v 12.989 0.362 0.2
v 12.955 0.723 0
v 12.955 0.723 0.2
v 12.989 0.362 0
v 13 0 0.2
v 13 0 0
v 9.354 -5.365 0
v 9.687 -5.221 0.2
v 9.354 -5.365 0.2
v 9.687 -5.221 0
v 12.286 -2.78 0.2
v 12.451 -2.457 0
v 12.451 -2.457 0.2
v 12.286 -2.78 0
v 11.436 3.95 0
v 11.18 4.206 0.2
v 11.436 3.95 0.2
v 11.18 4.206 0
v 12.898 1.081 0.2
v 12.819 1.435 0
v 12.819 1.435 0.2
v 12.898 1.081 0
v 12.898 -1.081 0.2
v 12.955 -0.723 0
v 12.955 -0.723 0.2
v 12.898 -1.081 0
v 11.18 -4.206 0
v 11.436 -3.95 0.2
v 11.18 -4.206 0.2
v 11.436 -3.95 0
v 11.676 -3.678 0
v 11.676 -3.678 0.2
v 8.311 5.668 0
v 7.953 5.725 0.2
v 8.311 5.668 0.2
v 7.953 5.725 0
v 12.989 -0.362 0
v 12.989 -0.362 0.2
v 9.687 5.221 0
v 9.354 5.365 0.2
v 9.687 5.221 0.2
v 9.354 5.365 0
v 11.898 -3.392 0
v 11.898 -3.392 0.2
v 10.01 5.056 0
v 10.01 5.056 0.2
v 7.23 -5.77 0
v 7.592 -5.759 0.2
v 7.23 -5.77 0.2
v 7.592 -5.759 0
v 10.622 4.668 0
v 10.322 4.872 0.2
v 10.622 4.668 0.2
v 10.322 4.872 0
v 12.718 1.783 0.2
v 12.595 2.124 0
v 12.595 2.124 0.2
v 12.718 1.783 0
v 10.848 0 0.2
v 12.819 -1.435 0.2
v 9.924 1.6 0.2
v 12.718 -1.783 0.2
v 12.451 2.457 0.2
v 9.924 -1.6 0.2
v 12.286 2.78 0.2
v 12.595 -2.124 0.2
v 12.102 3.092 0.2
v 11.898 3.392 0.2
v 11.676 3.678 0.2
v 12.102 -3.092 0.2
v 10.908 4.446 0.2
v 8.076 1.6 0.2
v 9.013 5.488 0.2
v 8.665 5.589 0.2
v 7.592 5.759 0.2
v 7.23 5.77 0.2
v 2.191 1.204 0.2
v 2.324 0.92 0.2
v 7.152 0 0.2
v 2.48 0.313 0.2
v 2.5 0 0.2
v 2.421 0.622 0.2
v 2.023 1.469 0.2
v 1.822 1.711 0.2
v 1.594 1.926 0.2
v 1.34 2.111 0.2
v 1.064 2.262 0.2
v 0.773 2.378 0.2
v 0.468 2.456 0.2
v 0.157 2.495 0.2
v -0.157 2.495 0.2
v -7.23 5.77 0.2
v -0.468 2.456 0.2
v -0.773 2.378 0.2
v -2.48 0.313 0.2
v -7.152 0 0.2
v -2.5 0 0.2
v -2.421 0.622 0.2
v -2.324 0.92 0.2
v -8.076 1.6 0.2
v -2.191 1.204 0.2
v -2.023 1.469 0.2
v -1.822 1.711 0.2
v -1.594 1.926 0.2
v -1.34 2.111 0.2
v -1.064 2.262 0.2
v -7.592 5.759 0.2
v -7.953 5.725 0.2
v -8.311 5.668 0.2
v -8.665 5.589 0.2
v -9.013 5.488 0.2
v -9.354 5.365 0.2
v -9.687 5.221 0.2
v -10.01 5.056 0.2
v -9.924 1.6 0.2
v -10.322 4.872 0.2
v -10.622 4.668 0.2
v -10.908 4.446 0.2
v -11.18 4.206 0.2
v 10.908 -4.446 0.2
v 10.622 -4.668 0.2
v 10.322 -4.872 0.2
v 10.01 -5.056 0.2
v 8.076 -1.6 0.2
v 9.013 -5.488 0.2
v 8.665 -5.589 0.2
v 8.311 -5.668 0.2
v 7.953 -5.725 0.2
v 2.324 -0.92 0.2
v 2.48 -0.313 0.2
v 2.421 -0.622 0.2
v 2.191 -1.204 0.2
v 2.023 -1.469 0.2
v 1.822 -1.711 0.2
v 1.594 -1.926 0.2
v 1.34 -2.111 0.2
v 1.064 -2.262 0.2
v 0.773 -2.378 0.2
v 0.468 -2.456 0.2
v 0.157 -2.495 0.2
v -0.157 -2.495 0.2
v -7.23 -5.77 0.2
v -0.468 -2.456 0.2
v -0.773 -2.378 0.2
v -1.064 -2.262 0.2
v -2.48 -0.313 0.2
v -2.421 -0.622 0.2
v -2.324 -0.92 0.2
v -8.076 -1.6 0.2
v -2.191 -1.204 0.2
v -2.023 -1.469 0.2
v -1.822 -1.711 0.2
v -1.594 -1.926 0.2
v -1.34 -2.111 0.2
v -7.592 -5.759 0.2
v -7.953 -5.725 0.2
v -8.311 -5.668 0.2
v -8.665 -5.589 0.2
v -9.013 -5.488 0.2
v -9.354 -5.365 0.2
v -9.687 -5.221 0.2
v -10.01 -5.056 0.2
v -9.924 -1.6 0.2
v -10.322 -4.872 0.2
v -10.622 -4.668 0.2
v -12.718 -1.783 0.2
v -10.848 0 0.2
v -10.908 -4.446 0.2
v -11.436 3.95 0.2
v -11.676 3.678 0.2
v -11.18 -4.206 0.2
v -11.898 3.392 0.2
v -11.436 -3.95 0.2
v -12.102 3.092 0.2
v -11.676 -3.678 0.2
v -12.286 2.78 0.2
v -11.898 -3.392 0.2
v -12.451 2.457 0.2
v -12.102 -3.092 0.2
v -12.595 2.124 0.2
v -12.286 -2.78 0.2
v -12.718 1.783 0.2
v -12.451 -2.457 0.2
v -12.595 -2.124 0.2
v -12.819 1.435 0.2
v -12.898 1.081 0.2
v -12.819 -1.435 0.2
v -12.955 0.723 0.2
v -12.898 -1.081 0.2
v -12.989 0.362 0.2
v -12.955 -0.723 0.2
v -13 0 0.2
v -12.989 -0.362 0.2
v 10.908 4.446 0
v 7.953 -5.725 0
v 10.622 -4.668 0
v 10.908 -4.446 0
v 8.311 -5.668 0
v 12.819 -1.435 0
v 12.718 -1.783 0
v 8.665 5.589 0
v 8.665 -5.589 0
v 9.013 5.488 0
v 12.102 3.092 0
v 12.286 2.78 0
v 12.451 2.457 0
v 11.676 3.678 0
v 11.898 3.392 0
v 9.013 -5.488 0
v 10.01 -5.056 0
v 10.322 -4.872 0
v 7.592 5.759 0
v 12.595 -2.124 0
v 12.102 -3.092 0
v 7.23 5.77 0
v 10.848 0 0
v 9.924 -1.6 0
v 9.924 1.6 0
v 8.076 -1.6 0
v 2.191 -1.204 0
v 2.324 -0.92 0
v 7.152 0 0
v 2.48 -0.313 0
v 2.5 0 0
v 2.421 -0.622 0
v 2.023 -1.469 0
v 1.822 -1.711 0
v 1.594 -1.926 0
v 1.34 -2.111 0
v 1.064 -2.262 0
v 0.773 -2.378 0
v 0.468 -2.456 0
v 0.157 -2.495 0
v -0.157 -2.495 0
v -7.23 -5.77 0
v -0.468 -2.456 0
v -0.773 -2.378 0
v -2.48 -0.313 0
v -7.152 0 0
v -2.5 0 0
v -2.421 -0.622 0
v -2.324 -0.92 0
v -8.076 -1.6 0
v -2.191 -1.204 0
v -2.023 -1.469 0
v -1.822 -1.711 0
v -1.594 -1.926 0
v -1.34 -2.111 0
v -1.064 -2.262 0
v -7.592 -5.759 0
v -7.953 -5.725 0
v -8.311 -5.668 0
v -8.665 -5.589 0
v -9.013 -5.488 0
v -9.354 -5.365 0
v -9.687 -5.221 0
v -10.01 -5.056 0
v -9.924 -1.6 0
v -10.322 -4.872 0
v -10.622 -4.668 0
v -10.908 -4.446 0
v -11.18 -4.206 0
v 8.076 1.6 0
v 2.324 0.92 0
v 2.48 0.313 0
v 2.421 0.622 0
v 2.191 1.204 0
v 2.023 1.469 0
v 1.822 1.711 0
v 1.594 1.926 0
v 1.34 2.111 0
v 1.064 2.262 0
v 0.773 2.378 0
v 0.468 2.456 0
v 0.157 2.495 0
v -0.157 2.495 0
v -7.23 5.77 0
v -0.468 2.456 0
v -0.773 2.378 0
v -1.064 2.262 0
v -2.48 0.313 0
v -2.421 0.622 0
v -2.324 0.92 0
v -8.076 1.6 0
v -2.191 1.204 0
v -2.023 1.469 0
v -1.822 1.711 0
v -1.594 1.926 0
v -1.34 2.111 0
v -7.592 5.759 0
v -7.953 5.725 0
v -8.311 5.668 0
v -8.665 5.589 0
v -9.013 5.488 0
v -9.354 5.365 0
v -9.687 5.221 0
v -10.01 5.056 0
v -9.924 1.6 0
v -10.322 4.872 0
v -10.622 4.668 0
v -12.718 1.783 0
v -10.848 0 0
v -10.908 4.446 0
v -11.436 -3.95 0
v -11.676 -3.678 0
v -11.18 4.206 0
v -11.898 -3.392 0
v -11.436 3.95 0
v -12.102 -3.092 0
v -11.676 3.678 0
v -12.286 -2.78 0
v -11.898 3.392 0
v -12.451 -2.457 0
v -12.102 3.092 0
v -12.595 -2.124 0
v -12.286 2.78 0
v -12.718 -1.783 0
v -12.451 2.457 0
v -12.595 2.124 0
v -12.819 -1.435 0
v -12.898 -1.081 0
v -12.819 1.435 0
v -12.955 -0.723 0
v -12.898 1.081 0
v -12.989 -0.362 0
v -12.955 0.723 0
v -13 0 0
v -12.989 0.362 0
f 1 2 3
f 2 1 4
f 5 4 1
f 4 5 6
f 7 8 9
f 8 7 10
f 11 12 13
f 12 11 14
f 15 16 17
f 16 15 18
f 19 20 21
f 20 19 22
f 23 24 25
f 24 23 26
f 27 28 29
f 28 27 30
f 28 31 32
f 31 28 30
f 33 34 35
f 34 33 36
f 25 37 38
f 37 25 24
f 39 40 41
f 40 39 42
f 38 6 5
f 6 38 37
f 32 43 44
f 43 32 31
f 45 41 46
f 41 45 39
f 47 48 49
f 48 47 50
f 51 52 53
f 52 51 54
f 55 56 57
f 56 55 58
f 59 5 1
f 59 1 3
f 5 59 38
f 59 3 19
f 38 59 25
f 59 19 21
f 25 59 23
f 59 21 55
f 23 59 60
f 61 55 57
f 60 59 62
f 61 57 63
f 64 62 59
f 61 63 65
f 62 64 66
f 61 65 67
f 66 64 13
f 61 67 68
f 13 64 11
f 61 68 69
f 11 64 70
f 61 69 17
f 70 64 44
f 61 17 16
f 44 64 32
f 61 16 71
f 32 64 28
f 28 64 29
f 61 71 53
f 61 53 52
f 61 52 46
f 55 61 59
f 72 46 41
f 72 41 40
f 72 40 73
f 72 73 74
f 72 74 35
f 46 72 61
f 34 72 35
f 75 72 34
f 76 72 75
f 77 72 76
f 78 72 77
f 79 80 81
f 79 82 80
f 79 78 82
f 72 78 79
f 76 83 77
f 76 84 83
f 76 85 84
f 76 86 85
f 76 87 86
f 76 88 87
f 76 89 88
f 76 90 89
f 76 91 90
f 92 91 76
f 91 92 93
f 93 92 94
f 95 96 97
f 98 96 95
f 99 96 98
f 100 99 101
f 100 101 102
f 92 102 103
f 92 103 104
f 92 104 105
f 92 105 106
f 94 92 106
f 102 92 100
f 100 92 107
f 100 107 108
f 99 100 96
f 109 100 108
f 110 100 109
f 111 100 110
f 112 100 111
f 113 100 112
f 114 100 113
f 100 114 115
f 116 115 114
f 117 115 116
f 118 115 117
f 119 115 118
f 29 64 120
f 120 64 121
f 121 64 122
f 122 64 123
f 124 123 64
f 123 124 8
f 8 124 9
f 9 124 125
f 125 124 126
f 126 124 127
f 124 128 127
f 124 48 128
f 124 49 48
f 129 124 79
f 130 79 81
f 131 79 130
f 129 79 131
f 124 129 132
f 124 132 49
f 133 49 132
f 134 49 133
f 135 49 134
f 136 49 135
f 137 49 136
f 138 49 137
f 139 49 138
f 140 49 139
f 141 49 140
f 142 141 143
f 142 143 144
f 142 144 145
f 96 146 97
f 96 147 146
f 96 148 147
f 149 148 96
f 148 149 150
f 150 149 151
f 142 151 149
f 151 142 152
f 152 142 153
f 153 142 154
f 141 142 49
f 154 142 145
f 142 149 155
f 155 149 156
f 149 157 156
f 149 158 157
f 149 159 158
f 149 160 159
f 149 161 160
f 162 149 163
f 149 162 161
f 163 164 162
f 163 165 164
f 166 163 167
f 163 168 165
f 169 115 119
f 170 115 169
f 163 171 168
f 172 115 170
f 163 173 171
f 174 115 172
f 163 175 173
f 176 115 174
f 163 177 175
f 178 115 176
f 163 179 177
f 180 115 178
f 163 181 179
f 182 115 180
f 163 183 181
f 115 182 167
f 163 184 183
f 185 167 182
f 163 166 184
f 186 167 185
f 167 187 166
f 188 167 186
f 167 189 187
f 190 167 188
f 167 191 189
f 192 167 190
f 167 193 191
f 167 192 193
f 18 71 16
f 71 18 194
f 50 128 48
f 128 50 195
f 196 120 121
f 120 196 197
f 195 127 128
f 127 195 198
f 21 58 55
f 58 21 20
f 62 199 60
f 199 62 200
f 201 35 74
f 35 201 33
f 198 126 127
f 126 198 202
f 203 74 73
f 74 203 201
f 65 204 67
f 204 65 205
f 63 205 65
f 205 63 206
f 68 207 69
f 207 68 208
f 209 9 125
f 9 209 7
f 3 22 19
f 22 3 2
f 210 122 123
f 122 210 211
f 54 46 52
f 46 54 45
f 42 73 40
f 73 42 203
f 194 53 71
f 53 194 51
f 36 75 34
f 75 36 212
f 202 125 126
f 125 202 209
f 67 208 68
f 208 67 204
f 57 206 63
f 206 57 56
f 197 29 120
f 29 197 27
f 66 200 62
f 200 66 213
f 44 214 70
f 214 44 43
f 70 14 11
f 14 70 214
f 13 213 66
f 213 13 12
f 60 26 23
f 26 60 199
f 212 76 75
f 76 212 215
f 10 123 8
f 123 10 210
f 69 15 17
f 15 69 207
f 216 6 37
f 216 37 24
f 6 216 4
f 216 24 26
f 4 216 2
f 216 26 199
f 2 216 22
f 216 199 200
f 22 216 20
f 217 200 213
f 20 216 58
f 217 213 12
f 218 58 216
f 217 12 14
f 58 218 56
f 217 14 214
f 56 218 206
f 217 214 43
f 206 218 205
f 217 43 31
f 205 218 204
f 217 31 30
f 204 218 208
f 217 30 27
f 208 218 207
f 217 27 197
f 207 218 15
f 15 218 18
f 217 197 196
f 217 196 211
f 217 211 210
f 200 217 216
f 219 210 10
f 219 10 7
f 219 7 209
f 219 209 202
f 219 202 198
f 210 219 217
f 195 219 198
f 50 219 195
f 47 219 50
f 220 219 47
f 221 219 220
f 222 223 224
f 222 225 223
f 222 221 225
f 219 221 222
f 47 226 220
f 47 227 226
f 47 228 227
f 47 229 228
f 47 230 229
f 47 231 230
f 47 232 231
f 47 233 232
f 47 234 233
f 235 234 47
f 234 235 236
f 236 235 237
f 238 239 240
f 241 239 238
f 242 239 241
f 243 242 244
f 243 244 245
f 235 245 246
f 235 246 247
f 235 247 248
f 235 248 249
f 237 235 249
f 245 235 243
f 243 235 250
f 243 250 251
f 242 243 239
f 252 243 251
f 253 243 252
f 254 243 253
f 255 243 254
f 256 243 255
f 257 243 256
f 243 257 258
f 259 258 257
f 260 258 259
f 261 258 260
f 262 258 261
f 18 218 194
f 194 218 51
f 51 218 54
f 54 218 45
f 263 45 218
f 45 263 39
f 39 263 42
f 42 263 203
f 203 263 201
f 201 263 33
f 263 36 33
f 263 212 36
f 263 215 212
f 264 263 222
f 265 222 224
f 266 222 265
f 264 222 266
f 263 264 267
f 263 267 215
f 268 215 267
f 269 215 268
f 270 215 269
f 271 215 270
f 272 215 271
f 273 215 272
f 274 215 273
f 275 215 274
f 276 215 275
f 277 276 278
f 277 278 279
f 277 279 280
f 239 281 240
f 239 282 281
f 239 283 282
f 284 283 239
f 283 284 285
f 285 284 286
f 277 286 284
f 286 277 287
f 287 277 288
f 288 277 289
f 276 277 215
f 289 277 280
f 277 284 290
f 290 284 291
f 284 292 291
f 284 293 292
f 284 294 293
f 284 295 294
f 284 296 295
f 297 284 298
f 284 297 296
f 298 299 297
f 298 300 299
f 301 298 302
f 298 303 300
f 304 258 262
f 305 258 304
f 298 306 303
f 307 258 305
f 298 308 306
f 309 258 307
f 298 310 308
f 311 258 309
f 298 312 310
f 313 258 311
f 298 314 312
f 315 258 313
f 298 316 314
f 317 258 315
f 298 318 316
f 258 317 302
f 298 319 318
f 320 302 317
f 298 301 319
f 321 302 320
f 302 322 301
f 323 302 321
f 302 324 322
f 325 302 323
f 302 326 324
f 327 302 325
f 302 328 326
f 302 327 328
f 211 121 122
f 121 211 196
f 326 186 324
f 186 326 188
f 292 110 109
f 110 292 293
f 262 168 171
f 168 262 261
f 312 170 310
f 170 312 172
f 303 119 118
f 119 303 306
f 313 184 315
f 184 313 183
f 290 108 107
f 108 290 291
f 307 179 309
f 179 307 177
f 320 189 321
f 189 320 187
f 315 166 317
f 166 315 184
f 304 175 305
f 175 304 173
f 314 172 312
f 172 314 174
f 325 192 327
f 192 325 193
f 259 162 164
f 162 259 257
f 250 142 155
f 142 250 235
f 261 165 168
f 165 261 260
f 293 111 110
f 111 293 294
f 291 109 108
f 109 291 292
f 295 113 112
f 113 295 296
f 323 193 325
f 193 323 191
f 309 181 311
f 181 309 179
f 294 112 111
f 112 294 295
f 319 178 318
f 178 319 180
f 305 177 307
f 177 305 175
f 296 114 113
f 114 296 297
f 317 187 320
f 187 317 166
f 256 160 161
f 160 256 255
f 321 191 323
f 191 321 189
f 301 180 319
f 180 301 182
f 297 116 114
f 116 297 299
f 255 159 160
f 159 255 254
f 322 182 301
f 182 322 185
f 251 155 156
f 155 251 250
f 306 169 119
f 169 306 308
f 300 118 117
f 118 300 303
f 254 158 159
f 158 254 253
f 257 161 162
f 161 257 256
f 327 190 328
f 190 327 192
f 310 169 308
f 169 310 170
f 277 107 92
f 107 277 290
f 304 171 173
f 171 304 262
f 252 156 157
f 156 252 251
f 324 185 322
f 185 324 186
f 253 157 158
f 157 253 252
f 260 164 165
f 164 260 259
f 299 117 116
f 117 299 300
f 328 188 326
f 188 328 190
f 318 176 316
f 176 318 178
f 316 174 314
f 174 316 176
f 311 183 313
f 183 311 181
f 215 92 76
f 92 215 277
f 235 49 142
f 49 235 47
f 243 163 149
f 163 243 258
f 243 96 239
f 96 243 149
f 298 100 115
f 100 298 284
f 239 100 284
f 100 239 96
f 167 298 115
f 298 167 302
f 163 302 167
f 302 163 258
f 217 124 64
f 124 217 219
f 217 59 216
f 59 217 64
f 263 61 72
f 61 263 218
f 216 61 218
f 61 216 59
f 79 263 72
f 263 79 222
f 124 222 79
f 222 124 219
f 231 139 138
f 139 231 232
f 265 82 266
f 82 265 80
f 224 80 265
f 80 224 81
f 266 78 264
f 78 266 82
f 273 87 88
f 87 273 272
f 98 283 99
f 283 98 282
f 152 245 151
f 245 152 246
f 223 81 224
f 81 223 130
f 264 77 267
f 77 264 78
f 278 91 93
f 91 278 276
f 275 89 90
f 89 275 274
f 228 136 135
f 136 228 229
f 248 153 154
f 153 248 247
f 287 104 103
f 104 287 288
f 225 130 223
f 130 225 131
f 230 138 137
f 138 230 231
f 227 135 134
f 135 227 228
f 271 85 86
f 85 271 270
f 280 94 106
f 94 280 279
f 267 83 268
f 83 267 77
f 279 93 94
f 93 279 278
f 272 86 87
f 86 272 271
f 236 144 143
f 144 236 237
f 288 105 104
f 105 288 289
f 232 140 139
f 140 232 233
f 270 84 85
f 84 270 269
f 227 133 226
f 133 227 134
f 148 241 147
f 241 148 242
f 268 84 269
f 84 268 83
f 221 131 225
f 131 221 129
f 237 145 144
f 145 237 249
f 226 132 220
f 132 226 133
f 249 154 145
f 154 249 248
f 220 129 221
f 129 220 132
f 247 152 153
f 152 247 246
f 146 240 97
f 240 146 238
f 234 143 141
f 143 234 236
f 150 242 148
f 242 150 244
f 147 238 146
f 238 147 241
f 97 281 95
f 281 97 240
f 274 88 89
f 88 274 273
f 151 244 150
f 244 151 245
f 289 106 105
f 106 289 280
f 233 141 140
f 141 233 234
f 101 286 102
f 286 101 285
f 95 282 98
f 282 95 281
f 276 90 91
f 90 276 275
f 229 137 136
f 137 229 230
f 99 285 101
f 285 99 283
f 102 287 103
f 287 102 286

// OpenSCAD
// file: polyhole_re.scad
// polyholes - correct diameter for printing holes
//
// See http://hydraraptor.blogspot.com/2011/02/polyholes.html
//
// inspired by Josef Prusa (Prusa i3)
//
// GNU GPL v3
// R.E. 2017.06



function polyhole_n(r) = max(round(4 * r),3);
function polyhole_radius(r) = r / cos (180 / polyhole_n(r));

module polyhole(h, r, center = false) {
    rotate([0,0,0])
        cylinder(h = h, r = polyhole_radius(r), center = center, $fn = polyhole_n(r));
}


//test
high=20;
radius=4;
cylinder(high,r=radius,center=false);
translate([-3*radius,0,0])
  polyhole(high,radius,center=false);
echo("<b>Radius=</b>",radius);
echo("<b>polyhole_rad_n=</b>",polyhole_n(radius));
echo("<b>polyhole_radius=</b>",polyhole_radius(radius));
// main file
// Anet A6 X-End - Blower & 3D-Touch/BL-Touch Mount & X-Endstop (optical) - BL-Touch washer
//
// GNU GPL v3
// R.E. 2017.06


use <polyhole_re.scad>

high=.2;

module 3D_touch_washer(high){
  difference(){
    union(){
      translate([7.23,0,0])
        cylinder(high,r=5.77,$fn=100);
      translate([-7.23,0,0])
        cylinder(high,r=5.77,$fn=100);
      translate([-7.23,-5.77,0])
        cube([7.23*2,5.77*2,high]);      
    }
    translate([-9,0,-1])
      polyhole(high+2,r=1.6);
    translate([9,0,-1])
      polyhole(high+2,r=1.6);
    translate([0,0,-1])
      cylinder(high+2,r=2.5,$fn=50);
  }
}


3D_touch_washer(high);

  
